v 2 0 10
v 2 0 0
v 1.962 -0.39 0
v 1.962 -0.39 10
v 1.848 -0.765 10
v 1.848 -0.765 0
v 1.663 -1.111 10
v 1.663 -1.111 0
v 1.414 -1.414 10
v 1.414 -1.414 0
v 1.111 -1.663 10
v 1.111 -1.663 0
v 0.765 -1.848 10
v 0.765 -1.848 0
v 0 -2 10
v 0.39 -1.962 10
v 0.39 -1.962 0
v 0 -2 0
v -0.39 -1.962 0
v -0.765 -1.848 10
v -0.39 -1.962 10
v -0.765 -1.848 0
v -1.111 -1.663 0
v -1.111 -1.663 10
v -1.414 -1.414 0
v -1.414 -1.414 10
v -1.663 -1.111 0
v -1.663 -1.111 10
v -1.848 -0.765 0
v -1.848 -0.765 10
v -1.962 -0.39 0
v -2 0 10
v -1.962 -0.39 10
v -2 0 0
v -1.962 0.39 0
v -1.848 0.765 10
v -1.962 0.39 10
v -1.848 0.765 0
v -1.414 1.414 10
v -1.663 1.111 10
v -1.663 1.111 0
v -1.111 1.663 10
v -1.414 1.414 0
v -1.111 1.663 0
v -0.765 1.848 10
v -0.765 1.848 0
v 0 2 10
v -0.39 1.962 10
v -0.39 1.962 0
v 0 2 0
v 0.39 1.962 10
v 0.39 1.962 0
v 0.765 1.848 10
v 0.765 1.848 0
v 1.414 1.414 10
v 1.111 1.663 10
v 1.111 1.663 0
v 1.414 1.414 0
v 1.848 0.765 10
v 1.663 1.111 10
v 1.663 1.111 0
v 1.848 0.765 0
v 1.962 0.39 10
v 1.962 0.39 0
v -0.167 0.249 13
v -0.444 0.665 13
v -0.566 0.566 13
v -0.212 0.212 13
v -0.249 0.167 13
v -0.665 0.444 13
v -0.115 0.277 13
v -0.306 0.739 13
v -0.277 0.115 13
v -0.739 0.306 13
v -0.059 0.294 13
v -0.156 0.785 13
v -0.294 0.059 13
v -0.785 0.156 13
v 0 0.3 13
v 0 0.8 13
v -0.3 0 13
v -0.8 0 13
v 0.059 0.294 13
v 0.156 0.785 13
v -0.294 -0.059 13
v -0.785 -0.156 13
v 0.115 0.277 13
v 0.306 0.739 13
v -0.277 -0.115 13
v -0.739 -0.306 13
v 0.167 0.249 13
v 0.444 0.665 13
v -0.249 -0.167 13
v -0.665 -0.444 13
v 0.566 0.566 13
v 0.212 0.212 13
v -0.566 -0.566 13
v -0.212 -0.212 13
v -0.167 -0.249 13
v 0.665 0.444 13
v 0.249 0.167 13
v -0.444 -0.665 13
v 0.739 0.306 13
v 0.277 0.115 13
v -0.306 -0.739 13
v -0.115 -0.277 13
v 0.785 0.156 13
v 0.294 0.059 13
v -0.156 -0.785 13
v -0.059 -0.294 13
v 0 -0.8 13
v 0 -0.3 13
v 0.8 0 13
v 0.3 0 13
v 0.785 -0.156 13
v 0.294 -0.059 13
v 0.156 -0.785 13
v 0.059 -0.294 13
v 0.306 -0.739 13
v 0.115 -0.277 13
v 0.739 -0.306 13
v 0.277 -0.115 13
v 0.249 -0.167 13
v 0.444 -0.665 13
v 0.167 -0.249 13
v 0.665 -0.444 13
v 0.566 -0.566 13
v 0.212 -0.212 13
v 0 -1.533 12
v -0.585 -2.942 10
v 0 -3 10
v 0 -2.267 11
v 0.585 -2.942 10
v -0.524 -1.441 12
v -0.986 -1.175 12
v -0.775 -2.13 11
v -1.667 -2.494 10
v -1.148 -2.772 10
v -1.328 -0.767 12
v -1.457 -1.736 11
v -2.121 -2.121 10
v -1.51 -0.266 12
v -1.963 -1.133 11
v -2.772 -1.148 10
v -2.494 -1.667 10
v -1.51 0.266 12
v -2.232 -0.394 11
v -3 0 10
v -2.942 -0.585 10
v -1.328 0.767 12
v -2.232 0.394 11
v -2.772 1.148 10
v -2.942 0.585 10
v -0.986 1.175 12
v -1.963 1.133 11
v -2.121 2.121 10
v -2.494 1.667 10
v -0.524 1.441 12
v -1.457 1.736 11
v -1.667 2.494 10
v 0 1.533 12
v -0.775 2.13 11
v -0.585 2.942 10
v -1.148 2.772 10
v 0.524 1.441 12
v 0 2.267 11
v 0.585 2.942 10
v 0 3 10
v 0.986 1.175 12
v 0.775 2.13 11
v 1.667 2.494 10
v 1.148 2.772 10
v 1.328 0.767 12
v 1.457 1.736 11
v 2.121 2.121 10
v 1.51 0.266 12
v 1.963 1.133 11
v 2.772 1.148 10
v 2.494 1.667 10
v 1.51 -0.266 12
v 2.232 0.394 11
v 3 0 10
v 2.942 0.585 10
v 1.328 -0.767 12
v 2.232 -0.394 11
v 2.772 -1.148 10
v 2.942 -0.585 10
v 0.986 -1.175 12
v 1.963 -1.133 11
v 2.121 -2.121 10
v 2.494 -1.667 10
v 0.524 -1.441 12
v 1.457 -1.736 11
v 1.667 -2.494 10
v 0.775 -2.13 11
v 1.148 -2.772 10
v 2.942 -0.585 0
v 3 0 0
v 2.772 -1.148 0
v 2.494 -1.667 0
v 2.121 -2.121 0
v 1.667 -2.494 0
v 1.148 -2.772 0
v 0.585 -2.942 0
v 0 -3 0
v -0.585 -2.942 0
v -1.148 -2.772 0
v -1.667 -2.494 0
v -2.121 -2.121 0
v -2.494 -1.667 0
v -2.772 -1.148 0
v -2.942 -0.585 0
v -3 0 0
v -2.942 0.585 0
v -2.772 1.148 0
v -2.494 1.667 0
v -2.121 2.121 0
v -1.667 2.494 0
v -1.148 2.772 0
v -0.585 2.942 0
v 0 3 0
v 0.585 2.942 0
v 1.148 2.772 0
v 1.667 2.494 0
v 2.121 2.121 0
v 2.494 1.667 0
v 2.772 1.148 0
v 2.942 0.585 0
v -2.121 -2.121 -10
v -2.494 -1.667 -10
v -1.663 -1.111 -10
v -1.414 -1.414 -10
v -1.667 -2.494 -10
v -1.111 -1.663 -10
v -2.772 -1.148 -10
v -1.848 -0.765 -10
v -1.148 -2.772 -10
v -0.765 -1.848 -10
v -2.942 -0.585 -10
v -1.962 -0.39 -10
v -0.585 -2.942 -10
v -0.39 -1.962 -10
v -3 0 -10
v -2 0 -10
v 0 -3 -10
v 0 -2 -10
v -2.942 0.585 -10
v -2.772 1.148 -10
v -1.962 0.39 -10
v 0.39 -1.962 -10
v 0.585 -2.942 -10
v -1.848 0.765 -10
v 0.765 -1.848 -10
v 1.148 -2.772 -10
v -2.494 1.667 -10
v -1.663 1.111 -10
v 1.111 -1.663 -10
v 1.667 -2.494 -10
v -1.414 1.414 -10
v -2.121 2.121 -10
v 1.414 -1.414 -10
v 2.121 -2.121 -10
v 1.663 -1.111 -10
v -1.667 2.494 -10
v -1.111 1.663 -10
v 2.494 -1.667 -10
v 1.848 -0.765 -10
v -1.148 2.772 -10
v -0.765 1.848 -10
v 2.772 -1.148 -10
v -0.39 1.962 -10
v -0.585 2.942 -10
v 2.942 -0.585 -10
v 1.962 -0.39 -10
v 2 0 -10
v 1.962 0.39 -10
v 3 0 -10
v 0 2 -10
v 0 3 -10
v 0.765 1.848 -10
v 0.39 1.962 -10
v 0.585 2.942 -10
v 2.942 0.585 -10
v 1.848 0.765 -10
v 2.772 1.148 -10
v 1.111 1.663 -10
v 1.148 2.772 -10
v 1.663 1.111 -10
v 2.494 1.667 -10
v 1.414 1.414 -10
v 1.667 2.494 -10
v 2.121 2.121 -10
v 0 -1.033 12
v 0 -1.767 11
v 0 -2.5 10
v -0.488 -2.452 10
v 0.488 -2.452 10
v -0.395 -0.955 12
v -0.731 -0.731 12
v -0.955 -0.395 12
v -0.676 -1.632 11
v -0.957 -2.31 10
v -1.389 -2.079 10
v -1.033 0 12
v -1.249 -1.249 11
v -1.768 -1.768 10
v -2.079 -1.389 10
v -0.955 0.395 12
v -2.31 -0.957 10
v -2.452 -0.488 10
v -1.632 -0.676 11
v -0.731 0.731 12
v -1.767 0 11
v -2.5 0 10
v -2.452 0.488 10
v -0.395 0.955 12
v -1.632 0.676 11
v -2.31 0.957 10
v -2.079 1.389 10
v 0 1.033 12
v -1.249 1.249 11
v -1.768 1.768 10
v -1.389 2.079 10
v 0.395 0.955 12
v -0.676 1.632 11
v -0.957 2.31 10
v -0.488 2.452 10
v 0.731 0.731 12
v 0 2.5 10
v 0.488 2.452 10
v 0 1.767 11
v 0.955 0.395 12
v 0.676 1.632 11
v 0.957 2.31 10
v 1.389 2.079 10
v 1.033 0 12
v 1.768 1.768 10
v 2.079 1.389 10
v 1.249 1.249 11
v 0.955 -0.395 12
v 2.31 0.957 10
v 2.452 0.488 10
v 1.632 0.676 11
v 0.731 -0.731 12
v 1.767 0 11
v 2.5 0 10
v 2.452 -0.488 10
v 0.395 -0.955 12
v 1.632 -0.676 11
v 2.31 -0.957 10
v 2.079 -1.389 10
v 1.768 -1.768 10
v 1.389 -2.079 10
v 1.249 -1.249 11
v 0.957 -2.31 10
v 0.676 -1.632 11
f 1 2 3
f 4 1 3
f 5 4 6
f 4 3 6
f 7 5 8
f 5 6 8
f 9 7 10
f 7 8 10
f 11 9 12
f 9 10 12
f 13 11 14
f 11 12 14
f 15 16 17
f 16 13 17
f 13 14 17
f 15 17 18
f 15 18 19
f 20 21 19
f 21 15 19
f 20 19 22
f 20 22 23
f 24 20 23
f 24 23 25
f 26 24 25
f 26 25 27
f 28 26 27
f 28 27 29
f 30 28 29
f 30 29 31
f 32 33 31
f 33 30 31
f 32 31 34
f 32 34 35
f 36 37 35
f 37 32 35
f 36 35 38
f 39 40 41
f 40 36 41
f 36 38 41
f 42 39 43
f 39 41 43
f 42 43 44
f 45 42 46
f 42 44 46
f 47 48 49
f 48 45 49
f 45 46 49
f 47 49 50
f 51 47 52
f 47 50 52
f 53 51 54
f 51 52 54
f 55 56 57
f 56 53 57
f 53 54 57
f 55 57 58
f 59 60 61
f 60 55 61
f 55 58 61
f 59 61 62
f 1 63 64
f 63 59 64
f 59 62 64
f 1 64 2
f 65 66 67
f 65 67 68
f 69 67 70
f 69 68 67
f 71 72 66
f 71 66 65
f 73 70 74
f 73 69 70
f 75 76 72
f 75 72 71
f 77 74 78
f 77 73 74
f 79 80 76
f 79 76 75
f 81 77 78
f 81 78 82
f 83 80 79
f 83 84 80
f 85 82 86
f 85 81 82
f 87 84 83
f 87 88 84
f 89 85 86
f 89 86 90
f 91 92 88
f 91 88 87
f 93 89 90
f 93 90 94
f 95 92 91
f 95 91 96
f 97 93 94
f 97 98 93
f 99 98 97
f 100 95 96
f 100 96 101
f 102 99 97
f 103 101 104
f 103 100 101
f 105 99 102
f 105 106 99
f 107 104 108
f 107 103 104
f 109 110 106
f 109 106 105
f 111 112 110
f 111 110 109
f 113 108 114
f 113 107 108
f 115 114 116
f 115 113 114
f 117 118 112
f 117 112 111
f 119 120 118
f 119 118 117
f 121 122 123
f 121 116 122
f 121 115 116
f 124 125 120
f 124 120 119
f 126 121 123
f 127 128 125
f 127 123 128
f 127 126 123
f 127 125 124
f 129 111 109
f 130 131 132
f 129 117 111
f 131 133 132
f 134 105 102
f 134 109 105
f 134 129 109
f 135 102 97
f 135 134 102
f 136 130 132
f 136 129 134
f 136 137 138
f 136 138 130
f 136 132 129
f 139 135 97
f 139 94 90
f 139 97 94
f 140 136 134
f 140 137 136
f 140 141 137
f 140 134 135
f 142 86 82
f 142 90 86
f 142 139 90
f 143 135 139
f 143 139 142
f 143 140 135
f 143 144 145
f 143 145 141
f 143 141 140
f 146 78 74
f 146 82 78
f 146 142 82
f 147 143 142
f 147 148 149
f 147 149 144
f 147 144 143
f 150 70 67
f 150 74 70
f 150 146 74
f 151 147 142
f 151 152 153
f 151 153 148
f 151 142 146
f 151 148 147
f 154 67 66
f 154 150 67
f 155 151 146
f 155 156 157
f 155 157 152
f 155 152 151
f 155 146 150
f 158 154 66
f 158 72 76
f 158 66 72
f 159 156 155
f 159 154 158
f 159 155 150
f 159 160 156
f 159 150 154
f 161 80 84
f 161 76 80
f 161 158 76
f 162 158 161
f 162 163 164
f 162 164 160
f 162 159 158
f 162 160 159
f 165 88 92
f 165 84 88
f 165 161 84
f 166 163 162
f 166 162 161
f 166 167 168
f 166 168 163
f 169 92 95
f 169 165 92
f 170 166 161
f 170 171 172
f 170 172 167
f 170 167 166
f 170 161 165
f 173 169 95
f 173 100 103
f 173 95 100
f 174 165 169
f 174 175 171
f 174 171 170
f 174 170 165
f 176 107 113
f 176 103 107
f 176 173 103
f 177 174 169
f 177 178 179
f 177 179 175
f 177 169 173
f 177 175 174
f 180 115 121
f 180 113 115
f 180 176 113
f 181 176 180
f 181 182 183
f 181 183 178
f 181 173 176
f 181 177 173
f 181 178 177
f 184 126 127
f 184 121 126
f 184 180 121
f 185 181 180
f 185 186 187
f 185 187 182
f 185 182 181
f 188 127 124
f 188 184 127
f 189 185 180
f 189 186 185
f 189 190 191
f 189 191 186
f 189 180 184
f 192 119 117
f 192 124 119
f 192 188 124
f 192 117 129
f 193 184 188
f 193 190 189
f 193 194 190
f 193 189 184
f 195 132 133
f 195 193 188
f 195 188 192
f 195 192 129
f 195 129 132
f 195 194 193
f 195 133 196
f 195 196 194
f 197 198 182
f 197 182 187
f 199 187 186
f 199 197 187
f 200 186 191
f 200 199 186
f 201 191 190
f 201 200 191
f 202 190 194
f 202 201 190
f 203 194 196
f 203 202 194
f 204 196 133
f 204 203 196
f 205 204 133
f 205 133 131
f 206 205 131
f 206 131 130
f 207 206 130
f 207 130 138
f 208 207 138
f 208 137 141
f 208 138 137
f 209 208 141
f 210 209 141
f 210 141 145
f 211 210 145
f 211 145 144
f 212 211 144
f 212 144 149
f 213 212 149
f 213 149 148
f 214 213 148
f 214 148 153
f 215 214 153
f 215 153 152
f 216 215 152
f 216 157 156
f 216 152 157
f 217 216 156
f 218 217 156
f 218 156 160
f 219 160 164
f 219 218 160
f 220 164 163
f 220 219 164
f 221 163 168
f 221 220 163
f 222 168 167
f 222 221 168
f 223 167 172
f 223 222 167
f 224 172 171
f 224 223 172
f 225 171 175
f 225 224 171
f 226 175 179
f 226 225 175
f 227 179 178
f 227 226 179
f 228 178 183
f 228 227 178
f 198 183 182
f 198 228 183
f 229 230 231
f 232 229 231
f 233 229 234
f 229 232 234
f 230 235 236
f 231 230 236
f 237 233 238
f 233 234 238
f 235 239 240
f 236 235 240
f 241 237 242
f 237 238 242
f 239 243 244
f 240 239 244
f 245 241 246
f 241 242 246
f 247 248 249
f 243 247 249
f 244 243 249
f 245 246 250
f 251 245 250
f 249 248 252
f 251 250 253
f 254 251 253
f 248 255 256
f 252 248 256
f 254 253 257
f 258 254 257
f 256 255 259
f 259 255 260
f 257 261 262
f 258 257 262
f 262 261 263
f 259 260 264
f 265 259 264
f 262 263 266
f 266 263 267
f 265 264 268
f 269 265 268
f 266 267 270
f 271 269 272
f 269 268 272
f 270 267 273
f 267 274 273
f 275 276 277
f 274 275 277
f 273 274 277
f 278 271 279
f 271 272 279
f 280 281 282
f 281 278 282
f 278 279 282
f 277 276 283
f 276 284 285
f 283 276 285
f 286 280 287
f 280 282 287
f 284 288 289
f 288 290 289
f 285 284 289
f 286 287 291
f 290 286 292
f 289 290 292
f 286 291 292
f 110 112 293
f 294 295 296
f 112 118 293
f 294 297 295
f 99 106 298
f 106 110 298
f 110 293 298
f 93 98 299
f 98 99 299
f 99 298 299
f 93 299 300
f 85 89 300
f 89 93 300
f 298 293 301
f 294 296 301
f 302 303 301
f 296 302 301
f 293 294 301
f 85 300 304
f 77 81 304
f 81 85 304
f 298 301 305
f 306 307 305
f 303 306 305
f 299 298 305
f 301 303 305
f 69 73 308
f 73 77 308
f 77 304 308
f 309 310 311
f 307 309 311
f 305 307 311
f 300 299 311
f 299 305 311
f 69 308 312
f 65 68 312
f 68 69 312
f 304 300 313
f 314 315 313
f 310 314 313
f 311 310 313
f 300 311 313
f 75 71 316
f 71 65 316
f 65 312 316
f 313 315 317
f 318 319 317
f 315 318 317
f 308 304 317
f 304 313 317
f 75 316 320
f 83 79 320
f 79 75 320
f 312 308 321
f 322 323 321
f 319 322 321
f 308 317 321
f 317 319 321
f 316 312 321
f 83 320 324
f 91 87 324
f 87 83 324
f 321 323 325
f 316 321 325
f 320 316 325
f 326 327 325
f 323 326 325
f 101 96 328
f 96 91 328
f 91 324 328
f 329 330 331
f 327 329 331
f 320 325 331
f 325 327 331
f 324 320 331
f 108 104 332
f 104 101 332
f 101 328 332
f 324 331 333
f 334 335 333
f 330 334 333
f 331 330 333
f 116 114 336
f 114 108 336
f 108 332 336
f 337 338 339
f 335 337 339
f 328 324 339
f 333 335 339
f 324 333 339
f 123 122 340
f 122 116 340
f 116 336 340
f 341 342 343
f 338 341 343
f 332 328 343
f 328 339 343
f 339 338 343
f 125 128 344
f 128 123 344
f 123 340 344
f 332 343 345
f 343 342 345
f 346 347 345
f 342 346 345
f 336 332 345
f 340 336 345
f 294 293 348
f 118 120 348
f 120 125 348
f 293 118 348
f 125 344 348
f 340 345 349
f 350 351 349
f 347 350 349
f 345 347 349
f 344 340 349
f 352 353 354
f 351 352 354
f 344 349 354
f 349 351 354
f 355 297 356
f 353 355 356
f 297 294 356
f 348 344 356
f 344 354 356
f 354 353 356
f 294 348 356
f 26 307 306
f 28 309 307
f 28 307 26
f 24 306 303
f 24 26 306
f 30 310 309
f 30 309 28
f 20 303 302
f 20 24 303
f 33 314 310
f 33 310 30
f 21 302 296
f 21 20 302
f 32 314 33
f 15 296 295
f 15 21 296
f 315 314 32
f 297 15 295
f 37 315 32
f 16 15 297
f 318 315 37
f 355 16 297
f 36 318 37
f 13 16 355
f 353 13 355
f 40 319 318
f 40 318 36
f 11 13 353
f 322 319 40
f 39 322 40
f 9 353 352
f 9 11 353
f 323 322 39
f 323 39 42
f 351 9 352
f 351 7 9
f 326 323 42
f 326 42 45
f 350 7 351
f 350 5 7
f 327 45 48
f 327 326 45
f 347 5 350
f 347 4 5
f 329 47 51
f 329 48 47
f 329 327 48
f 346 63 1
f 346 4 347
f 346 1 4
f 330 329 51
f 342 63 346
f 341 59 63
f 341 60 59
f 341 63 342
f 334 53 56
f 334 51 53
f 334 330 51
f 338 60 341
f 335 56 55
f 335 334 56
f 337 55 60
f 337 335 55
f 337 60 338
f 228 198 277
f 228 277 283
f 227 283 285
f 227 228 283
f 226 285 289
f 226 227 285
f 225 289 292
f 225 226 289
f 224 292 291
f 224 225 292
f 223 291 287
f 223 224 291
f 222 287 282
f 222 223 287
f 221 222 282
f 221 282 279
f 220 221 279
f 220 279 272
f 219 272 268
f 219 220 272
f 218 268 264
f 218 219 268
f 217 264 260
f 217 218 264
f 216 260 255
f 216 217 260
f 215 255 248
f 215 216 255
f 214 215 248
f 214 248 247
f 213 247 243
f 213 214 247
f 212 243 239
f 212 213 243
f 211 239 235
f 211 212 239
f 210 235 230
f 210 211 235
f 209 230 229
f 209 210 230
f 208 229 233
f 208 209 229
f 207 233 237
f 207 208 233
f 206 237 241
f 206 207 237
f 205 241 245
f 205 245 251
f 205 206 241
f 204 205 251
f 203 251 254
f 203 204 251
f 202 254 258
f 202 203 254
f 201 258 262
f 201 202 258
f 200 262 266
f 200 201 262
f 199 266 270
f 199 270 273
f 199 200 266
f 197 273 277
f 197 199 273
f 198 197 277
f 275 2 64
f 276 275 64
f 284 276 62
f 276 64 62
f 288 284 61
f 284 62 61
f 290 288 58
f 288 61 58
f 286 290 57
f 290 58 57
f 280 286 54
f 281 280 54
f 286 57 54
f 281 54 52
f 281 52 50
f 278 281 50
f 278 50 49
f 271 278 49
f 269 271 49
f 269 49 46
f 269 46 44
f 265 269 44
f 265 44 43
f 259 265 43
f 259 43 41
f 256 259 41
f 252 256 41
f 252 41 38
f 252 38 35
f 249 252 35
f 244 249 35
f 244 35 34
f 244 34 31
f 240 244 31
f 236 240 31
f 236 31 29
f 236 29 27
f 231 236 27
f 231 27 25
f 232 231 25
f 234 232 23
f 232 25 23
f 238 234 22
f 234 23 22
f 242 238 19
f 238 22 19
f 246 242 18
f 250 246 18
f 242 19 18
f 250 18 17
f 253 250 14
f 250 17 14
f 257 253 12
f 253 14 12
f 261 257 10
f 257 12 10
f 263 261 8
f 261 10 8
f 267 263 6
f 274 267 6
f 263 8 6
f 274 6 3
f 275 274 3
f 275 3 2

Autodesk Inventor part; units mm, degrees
ref_plane "YZ Plane" through (0, 0, 0) normal (1, 0, 0) x (0, 1, 0)
ref_plane "XZ Plane" through (0, 0, 0) normal (0, 1, 0) x (-1, 0, 0)
ref_plane "XY Plane" through (0, 0, 0) normal (0, 0, 1) x (1, 0, 0)
sketch "Sketch1" plane through (0, 0, 0) normal (0, 0, 1) x (1, 0, 0)
  circle A0 centre (0, 0) radius 3
  circle A1 centre (0, 0) radius 2
  dimension "d0" = 6
  dimension "d1" = 4
extrude "Extrusion1" add sketch "Sketch1" along normal mid plane 20
sketch "Sketch2" plane through (0, 0, 0) normal (1, 0, 0) x (0, 1, 0)
  line L0 (3, 10) -> (-3, 10) construction
  line L1 (0, 10) -> (0, 13) construction
  line L2 (-3, -10) -> (-3, 10) construction
  line L3 (-3, 10) -> (-0.8, 13)
  line L4 (-0.8, 13) -> (-0.3, 13)
  line L5 (-0.3, 13) -> (-2.5, 10)
  line L6 (-3, 10) -> (-2.5, 10)
  point P0 (0, 0)
  point P1 (-0.55, 13)
  dimension "d4" = 3
  dimension "d6" = 0.3
  dimension "d7" = 0.5
revolve "Revolution1" add sketch "Sketch2" angle 360 about axis through (0, 0, 10) along (0, 0, 1)
properties part number "Nozzle"
